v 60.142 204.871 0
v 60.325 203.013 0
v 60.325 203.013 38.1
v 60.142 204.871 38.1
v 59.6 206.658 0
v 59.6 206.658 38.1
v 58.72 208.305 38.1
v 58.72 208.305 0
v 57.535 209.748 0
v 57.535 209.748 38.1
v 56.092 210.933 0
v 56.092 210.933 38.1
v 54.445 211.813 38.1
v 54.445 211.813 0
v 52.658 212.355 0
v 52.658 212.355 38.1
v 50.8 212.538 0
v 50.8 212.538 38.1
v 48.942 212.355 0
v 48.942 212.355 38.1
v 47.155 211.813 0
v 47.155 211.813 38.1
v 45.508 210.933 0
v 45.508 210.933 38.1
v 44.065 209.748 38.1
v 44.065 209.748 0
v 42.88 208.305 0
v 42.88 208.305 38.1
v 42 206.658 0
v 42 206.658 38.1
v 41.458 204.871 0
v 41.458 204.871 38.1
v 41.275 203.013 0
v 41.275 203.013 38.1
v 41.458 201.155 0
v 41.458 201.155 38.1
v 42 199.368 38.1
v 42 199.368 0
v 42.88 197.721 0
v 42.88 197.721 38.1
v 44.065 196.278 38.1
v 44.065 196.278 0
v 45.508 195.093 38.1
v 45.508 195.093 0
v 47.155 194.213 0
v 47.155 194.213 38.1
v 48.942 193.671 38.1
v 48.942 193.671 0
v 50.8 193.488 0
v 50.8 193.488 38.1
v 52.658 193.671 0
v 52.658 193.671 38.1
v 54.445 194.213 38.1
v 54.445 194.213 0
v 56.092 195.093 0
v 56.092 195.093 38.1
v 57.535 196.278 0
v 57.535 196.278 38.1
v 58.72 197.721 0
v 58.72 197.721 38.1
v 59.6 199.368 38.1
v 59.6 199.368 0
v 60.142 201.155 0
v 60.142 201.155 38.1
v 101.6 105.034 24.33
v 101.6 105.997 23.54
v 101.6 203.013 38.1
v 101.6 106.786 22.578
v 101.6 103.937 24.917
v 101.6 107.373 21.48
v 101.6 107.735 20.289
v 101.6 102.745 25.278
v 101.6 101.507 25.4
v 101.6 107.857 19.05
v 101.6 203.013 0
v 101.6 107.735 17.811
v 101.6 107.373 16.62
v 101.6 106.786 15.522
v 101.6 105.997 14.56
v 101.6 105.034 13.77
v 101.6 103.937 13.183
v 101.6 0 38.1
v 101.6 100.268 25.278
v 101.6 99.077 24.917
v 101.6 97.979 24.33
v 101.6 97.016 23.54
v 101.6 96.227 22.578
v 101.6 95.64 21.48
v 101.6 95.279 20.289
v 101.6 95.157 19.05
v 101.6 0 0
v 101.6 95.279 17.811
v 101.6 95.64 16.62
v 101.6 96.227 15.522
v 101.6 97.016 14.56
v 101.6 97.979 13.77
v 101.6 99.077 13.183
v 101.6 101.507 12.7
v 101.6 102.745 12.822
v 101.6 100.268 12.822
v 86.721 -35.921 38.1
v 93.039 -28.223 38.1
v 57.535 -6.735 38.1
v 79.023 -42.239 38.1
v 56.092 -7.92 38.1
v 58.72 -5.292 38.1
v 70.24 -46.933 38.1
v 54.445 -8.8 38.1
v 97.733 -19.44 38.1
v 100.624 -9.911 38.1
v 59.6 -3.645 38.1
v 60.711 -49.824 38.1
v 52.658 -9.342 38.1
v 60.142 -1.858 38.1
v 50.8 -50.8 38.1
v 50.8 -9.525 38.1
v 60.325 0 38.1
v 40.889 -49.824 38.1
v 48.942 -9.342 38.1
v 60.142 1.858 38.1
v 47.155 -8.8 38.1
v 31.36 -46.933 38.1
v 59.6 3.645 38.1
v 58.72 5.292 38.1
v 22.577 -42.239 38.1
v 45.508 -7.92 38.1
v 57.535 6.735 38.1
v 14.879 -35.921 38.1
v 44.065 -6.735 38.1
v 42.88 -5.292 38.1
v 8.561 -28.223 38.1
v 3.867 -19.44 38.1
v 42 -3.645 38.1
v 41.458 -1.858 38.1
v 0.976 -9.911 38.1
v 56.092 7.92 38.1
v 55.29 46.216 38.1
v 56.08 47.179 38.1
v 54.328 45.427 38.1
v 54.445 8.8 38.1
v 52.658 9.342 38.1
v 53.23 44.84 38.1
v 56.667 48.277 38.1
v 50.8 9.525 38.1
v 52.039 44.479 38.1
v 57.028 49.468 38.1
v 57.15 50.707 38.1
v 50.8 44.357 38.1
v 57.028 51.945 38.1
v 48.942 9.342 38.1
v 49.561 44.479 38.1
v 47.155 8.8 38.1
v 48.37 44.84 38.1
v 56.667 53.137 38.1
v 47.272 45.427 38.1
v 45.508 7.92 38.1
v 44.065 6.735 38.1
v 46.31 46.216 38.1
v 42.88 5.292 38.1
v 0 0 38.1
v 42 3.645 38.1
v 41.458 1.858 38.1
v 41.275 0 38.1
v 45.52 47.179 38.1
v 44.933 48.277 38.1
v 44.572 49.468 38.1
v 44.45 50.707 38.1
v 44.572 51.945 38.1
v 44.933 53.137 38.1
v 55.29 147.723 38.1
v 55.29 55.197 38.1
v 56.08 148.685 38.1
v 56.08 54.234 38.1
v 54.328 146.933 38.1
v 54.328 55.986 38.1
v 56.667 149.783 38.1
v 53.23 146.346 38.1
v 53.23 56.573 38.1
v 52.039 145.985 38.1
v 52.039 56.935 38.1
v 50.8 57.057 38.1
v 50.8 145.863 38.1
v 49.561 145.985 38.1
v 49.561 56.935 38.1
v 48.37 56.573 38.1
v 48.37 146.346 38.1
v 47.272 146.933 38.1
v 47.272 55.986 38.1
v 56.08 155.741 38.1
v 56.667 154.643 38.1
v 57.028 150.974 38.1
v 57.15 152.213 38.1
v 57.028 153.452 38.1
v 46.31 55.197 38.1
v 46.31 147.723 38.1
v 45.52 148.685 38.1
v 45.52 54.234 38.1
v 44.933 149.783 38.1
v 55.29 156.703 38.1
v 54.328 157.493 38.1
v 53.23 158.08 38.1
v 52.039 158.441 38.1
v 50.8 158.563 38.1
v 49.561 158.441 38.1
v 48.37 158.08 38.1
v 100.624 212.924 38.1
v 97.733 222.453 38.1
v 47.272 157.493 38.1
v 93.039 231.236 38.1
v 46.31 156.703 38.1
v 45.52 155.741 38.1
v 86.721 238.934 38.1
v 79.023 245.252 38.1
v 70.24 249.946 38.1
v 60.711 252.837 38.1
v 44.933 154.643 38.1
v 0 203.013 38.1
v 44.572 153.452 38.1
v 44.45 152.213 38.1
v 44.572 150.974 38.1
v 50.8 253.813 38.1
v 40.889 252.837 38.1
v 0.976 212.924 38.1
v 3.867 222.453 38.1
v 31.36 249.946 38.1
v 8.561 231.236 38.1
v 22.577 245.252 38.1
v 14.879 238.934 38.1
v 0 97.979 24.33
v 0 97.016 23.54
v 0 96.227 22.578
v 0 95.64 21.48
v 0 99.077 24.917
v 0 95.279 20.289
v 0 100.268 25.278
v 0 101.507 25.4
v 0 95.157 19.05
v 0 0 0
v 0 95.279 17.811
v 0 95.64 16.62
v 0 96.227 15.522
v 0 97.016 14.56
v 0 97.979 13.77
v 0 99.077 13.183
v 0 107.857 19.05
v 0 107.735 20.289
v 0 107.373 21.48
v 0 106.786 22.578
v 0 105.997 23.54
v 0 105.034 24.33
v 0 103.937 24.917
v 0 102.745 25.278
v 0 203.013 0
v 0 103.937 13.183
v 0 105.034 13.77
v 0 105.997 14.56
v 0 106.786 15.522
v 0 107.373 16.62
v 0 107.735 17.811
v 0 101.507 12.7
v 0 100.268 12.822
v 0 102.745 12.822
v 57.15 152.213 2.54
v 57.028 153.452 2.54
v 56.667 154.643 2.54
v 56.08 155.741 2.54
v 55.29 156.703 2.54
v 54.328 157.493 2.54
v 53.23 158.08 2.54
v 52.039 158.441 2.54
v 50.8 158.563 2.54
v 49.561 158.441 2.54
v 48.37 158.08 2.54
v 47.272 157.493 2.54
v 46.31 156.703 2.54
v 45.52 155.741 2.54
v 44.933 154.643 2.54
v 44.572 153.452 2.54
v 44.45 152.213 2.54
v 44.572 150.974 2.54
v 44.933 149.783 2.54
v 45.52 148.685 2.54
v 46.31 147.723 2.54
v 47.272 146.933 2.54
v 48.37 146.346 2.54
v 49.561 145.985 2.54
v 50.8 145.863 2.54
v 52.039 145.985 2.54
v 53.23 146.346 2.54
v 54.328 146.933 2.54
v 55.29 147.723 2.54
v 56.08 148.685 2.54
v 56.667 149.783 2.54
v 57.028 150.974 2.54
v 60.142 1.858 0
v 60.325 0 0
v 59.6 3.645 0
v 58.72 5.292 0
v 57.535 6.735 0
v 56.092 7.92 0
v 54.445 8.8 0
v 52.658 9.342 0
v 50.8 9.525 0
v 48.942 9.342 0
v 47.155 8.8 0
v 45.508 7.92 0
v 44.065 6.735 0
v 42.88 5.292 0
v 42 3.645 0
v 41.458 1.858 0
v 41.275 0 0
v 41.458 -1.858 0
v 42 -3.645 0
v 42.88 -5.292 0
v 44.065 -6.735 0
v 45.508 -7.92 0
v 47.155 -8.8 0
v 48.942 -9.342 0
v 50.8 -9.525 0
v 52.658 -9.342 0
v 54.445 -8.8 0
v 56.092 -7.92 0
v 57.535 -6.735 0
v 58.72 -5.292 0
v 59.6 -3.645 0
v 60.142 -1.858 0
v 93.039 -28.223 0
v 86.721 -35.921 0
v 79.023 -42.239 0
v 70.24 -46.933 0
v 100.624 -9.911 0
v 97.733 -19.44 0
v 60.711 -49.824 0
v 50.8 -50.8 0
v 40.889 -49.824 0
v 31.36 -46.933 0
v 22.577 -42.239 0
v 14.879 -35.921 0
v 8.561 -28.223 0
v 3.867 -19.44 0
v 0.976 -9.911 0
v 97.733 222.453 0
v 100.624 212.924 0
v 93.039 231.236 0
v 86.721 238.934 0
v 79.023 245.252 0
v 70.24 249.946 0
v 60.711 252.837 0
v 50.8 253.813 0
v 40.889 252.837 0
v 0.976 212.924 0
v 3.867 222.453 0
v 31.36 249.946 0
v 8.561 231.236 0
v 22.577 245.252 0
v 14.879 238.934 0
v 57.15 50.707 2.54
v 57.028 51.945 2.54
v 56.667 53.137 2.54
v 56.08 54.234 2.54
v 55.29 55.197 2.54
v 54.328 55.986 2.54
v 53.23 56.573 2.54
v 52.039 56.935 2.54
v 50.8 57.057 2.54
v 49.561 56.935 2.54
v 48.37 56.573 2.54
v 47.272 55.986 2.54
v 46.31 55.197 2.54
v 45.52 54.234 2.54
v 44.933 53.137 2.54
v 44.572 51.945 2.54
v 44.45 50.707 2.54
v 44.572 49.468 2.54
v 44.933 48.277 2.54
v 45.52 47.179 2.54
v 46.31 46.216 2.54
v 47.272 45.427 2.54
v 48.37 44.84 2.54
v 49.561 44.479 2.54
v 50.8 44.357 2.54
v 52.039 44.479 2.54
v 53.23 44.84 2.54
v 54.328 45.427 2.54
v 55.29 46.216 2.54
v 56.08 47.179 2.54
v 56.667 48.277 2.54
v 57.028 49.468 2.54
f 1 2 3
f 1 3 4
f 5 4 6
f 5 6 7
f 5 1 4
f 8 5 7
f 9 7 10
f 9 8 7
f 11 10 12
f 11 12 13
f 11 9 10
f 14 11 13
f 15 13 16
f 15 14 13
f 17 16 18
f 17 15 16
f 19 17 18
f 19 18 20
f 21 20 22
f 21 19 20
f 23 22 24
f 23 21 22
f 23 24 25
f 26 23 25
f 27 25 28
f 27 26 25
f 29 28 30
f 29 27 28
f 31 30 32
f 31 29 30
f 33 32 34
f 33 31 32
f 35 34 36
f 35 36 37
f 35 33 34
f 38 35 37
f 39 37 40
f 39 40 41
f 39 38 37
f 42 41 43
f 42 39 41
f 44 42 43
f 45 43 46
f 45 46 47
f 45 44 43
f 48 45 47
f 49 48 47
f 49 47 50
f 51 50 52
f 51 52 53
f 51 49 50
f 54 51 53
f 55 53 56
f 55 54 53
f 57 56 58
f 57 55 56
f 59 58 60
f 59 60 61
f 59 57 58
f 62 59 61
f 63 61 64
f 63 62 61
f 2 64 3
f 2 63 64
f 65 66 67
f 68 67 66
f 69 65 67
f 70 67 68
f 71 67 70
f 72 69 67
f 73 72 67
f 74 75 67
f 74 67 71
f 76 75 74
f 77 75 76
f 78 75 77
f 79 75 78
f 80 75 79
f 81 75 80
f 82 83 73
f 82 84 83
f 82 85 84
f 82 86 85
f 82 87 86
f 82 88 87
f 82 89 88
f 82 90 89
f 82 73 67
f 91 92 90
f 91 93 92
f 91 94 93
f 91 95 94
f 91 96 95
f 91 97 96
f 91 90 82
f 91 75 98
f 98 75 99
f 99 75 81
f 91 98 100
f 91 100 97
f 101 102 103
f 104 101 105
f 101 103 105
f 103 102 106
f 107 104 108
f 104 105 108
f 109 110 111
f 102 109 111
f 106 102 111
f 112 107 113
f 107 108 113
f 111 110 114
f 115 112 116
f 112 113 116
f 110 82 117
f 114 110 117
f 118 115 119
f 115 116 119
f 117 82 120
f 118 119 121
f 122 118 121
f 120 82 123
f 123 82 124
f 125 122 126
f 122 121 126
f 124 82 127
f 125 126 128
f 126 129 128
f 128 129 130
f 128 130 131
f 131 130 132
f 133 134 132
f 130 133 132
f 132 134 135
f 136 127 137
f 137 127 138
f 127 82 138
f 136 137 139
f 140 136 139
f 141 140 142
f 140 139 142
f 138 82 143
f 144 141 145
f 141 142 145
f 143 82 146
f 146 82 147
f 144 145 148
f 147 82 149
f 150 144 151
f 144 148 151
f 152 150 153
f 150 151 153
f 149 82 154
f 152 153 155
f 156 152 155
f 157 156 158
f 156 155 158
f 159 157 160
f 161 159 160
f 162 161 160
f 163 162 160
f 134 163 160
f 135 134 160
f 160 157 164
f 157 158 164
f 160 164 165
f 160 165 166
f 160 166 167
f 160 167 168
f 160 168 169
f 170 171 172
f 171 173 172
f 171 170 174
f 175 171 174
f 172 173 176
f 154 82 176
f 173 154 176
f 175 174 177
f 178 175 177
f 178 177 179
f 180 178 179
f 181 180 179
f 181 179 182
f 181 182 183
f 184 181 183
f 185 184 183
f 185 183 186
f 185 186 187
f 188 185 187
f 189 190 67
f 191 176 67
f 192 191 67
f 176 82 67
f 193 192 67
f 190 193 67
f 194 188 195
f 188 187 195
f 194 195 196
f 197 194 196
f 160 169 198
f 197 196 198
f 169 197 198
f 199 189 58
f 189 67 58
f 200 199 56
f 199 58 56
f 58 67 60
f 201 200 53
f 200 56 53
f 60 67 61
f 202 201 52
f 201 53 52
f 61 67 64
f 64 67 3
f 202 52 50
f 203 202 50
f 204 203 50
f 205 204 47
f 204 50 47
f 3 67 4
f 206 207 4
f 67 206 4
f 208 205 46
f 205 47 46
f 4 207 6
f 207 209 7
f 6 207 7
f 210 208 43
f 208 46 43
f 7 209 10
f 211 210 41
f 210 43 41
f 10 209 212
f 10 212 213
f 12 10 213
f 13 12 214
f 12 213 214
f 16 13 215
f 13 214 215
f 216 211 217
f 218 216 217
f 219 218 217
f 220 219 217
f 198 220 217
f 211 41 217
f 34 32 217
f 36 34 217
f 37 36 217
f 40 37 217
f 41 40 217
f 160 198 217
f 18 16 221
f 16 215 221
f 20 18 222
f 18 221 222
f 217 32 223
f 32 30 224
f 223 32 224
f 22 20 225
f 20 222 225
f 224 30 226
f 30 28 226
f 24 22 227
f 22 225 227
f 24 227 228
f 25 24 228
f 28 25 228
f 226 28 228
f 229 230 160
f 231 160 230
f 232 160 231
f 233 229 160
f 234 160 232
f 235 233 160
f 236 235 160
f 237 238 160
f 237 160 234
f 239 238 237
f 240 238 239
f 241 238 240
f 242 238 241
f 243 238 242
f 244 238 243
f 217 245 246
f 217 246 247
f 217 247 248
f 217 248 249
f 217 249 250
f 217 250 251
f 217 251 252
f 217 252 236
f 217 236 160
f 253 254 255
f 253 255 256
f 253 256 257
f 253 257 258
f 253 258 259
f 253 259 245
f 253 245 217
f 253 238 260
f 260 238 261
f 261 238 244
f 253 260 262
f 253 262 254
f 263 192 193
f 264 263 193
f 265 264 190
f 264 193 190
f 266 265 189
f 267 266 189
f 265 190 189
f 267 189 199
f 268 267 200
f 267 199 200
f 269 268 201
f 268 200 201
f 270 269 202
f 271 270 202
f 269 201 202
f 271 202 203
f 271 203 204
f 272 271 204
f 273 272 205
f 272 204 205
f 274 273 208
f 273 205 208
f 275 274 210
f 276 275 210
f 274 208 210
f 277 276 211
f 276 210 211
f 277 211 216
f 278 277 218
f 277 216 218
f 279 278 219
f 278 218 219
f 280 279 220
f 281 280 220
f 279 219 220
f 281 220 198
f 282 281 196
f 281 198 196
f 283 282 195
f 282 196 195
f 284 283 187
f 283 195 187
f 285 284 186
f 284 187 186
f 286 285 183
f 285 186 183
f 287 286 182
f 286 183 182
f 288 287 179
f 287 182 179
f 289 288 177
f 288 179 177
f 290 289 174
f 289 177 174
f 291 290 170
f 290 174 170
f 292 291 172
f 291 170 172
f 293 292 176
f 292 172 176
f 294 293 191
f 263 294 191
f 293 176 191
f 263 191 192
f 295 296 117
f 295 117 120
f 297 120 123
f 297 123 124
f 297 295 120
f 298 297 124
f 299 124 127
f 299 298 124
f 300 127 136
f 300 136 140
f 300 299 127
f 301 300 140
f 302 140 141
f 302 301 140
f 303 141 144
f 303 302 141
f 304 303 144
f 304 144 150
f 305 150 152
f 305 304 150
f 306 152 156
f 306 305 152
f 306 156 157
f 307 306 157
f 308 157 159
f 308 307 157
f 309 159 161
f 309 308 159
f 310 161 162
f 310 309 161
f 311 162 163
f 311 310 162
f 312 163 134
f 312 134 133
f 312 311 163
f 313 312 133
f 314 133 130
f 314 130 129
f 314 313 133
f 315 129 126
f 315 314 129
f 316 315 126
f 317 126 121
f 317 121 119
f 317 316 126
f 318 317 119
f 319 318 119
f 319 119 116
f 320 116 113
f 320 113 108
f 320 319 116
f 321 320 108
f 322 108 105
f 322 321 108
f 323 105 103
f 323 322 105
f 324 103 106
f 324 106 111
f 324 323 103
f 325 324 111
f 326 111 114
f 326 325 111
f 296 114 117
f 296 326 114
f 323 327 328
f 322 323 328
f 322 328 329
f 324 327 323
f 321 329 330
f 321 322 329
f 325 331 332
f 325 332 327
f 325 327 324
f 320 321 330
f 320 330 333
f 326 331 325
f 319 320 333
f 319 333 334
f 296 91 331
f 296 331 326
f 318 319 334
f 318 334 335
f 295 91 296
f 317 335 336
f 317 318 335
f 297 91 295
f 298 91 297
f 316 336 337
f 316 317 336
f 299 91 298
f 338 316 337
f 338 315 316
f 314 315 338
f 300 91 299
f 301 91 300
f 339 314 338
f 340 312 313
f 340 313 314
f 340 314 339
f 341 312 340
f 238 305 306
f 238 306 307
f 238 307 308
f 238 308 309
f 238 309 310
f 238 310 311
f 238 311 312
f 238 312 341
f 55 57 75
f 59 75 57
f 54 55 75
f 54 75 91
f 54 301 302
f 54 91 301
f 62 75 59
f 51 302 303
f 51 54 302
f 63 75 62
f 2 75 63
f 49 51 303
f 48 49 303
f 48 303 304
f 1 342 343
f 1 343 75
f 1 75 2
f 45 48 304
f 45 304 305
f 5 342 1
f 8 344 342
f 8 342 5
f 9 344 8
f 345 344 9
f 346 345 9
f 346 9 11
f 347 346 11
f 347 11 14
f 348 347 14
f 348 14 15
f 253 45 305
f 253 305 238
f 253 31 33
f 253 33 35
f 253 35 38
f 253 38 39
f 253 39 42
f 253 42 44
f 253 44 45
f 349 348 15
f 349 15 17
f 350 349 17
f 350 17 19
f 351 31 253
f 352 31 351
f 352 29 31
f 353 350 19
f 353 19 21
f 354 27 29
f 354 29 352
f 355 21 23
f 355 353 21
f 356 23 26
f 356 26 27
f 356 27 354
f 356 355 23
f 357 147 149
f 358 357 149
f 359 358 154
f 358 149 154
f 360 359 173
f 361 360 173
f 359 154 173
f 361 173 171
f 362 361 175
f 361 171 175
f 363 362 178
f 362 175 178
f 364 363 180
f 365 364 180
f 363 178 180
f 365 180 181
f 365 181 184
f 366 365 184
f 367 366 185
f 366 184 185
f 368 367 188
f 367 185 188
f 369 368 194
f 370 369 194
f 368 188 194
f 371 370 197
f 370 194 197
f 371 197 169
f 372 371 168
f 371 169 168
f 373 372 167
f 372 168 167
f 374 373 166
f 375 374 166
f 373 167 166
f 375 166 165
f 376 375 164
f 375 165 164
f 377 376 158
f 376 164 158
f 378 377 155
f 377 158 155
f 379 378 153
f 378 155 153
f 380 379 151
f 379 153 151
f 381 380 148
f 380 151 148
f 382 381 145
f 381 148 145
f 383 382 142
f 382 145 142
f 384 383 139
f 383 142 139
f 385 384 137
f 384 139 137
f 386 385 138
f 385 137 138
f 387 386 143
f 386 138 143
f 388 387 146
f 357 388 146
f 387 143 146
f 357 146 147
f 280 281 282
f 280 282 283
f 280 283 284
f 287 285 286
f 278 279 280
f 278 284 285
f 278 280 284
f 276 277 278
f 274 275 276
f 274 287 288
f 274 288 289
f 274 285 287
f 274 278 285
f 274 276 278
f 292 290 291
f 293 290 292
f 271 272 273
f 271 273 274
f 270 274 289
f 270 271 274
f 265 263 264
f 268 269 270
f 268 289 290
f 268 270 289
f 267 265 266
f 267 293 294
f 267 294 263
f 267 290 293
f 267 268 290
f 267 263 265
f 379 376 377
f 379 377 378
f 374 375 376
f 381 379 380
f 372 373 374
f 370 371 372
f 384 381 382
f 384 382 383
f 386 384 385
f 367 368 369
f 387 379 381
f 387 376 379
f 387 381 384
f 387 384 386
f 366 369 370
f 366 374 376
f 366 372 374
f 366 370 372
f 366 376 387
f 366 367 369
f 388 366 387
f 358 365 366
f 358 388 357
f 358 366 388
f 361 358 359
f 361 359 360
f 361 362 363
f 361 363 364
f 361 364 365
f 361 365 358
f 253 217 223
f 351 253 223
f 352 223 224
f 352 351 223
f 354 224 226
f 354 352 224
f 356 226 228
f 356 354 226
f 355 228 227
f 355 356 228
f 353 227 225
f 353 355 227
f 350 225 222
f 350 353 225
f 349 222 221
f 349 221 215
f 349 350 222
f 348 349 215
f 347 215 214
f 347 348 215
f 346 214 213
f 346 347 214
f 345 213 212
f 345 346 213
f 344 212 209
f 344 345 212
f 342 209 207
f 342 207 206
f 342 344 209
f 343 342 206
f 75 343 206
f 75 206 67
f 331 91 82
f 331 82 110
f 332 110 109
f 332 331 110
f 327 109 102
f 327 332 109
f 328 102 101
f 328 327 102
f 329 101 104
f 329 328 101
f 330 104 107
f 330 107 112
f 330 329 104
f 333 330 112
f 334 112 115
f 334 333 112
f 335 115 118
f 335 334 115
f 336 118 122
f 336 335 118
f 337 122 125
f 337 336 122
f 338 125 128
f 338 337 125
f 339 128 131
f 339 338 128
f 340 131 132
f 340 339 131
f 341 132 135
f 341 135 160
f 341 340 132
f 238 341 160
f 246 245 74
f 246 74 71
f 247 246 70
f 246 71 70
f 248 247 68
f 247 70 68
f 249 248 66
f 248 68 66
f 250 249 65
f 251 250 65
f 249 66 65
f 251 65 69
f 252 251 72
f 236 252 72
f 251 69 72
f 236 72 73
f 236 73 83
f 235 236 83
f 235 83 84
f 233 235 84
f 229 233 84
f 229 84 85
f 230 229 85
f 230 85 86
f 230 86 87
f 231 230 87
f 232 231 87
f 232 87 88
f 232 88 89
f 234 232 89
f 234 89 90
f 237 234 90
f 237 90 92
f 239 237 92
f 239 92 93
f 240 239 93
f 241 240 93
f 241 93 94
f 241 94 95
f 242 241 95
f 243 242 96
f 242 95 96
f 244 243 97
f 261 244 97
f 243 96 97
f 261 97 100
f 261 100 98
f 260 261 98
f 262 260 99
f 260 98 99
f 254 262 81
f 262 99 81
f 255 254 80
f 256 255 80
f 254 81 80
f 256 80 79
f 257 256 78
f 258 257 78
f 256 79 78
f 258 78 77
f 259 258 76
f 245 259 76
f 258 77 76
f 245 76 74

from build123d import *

# Parameters (mm, degrees)
BOSS_EXTRUDE1_DEPTH     = 38.1
SKETCH2_R               = 6.35
CUT_EXTRUDE1_DEPTH      = 277.034883433
ADVANCEDHOLE3_OUTLINE_R = 9.525
ADVANCEDHOLE3_DEPTH     = 38.1
SKETCH21_R              = 6.35
CUT_EXTRUDE2_DEPTH      = 35.56


# Read off the part's stored shape, not the designer's step: AdvancedHole3
with BuildPart() as part:
    # Sketch1 → Boss-Extrude1 (new body)
    with BuildSketch(Plane.XY):
        with BuildLine():
            Line((0, 0), (0, 203.013094366))
            ThreePointArc((0, 203.013094366), (50.8, 253.813094366), (101.6, 203.013094366))
            Line((101.6, 203.013094366), (101.6, 0))
            ThreePointArc((101.6, 0), (50.8, -50.8), (0, 0))
        make_face()
    extrude(amount=BOSS_EXTRUDE1_DEPTH)

    # Sketch2 → Cut-Extrude1 (cut, through all)
    with BuildSketch(Plane(origin=(101.6, 0, 0), x_dir=(0, 0, -1), z_dir=(1, 0, 0))):
        with Locations(Location((-19.05, 101.506547183, 0), (0, 0, 90))):
            Circle(SKETCH2_R)
    extrude(amount=-CUT_EXTRUDE1_DEPTH, mode=Mode.SUBTRACT)

    # AdvancedHole3 outline → AdvancedHole3 (cut)
    with BuildSketch(Plane.XY):
        with Locations((50.8, 203.013094366)):
            Circle(ADVANCEDHOLE3_OUTLINE_R)
        with Locations((50.8, 0)):
            Circle(ADVANCEDHOLE3_OUTLINE_R)
    extrude(amount=ADVANCEDHOLE3_DEPTH, mode=Mode.SUBTRACT)

    # Sketch21 → Cut-Extrude2 (cut)
    with BuildSketch(Plane.XY.offset(38.1)):
        with Locations((50.8, 50.706547183)):
            Circle(SKETCH21_R)
        with Locations((50.8, 152.213094366)):
            Circle(SKETCH21_R)
    extrude(amount=-CUT_EXTRUDE2_DEPTH, mode=Mode.SUBTRACT)


solid = part.part
